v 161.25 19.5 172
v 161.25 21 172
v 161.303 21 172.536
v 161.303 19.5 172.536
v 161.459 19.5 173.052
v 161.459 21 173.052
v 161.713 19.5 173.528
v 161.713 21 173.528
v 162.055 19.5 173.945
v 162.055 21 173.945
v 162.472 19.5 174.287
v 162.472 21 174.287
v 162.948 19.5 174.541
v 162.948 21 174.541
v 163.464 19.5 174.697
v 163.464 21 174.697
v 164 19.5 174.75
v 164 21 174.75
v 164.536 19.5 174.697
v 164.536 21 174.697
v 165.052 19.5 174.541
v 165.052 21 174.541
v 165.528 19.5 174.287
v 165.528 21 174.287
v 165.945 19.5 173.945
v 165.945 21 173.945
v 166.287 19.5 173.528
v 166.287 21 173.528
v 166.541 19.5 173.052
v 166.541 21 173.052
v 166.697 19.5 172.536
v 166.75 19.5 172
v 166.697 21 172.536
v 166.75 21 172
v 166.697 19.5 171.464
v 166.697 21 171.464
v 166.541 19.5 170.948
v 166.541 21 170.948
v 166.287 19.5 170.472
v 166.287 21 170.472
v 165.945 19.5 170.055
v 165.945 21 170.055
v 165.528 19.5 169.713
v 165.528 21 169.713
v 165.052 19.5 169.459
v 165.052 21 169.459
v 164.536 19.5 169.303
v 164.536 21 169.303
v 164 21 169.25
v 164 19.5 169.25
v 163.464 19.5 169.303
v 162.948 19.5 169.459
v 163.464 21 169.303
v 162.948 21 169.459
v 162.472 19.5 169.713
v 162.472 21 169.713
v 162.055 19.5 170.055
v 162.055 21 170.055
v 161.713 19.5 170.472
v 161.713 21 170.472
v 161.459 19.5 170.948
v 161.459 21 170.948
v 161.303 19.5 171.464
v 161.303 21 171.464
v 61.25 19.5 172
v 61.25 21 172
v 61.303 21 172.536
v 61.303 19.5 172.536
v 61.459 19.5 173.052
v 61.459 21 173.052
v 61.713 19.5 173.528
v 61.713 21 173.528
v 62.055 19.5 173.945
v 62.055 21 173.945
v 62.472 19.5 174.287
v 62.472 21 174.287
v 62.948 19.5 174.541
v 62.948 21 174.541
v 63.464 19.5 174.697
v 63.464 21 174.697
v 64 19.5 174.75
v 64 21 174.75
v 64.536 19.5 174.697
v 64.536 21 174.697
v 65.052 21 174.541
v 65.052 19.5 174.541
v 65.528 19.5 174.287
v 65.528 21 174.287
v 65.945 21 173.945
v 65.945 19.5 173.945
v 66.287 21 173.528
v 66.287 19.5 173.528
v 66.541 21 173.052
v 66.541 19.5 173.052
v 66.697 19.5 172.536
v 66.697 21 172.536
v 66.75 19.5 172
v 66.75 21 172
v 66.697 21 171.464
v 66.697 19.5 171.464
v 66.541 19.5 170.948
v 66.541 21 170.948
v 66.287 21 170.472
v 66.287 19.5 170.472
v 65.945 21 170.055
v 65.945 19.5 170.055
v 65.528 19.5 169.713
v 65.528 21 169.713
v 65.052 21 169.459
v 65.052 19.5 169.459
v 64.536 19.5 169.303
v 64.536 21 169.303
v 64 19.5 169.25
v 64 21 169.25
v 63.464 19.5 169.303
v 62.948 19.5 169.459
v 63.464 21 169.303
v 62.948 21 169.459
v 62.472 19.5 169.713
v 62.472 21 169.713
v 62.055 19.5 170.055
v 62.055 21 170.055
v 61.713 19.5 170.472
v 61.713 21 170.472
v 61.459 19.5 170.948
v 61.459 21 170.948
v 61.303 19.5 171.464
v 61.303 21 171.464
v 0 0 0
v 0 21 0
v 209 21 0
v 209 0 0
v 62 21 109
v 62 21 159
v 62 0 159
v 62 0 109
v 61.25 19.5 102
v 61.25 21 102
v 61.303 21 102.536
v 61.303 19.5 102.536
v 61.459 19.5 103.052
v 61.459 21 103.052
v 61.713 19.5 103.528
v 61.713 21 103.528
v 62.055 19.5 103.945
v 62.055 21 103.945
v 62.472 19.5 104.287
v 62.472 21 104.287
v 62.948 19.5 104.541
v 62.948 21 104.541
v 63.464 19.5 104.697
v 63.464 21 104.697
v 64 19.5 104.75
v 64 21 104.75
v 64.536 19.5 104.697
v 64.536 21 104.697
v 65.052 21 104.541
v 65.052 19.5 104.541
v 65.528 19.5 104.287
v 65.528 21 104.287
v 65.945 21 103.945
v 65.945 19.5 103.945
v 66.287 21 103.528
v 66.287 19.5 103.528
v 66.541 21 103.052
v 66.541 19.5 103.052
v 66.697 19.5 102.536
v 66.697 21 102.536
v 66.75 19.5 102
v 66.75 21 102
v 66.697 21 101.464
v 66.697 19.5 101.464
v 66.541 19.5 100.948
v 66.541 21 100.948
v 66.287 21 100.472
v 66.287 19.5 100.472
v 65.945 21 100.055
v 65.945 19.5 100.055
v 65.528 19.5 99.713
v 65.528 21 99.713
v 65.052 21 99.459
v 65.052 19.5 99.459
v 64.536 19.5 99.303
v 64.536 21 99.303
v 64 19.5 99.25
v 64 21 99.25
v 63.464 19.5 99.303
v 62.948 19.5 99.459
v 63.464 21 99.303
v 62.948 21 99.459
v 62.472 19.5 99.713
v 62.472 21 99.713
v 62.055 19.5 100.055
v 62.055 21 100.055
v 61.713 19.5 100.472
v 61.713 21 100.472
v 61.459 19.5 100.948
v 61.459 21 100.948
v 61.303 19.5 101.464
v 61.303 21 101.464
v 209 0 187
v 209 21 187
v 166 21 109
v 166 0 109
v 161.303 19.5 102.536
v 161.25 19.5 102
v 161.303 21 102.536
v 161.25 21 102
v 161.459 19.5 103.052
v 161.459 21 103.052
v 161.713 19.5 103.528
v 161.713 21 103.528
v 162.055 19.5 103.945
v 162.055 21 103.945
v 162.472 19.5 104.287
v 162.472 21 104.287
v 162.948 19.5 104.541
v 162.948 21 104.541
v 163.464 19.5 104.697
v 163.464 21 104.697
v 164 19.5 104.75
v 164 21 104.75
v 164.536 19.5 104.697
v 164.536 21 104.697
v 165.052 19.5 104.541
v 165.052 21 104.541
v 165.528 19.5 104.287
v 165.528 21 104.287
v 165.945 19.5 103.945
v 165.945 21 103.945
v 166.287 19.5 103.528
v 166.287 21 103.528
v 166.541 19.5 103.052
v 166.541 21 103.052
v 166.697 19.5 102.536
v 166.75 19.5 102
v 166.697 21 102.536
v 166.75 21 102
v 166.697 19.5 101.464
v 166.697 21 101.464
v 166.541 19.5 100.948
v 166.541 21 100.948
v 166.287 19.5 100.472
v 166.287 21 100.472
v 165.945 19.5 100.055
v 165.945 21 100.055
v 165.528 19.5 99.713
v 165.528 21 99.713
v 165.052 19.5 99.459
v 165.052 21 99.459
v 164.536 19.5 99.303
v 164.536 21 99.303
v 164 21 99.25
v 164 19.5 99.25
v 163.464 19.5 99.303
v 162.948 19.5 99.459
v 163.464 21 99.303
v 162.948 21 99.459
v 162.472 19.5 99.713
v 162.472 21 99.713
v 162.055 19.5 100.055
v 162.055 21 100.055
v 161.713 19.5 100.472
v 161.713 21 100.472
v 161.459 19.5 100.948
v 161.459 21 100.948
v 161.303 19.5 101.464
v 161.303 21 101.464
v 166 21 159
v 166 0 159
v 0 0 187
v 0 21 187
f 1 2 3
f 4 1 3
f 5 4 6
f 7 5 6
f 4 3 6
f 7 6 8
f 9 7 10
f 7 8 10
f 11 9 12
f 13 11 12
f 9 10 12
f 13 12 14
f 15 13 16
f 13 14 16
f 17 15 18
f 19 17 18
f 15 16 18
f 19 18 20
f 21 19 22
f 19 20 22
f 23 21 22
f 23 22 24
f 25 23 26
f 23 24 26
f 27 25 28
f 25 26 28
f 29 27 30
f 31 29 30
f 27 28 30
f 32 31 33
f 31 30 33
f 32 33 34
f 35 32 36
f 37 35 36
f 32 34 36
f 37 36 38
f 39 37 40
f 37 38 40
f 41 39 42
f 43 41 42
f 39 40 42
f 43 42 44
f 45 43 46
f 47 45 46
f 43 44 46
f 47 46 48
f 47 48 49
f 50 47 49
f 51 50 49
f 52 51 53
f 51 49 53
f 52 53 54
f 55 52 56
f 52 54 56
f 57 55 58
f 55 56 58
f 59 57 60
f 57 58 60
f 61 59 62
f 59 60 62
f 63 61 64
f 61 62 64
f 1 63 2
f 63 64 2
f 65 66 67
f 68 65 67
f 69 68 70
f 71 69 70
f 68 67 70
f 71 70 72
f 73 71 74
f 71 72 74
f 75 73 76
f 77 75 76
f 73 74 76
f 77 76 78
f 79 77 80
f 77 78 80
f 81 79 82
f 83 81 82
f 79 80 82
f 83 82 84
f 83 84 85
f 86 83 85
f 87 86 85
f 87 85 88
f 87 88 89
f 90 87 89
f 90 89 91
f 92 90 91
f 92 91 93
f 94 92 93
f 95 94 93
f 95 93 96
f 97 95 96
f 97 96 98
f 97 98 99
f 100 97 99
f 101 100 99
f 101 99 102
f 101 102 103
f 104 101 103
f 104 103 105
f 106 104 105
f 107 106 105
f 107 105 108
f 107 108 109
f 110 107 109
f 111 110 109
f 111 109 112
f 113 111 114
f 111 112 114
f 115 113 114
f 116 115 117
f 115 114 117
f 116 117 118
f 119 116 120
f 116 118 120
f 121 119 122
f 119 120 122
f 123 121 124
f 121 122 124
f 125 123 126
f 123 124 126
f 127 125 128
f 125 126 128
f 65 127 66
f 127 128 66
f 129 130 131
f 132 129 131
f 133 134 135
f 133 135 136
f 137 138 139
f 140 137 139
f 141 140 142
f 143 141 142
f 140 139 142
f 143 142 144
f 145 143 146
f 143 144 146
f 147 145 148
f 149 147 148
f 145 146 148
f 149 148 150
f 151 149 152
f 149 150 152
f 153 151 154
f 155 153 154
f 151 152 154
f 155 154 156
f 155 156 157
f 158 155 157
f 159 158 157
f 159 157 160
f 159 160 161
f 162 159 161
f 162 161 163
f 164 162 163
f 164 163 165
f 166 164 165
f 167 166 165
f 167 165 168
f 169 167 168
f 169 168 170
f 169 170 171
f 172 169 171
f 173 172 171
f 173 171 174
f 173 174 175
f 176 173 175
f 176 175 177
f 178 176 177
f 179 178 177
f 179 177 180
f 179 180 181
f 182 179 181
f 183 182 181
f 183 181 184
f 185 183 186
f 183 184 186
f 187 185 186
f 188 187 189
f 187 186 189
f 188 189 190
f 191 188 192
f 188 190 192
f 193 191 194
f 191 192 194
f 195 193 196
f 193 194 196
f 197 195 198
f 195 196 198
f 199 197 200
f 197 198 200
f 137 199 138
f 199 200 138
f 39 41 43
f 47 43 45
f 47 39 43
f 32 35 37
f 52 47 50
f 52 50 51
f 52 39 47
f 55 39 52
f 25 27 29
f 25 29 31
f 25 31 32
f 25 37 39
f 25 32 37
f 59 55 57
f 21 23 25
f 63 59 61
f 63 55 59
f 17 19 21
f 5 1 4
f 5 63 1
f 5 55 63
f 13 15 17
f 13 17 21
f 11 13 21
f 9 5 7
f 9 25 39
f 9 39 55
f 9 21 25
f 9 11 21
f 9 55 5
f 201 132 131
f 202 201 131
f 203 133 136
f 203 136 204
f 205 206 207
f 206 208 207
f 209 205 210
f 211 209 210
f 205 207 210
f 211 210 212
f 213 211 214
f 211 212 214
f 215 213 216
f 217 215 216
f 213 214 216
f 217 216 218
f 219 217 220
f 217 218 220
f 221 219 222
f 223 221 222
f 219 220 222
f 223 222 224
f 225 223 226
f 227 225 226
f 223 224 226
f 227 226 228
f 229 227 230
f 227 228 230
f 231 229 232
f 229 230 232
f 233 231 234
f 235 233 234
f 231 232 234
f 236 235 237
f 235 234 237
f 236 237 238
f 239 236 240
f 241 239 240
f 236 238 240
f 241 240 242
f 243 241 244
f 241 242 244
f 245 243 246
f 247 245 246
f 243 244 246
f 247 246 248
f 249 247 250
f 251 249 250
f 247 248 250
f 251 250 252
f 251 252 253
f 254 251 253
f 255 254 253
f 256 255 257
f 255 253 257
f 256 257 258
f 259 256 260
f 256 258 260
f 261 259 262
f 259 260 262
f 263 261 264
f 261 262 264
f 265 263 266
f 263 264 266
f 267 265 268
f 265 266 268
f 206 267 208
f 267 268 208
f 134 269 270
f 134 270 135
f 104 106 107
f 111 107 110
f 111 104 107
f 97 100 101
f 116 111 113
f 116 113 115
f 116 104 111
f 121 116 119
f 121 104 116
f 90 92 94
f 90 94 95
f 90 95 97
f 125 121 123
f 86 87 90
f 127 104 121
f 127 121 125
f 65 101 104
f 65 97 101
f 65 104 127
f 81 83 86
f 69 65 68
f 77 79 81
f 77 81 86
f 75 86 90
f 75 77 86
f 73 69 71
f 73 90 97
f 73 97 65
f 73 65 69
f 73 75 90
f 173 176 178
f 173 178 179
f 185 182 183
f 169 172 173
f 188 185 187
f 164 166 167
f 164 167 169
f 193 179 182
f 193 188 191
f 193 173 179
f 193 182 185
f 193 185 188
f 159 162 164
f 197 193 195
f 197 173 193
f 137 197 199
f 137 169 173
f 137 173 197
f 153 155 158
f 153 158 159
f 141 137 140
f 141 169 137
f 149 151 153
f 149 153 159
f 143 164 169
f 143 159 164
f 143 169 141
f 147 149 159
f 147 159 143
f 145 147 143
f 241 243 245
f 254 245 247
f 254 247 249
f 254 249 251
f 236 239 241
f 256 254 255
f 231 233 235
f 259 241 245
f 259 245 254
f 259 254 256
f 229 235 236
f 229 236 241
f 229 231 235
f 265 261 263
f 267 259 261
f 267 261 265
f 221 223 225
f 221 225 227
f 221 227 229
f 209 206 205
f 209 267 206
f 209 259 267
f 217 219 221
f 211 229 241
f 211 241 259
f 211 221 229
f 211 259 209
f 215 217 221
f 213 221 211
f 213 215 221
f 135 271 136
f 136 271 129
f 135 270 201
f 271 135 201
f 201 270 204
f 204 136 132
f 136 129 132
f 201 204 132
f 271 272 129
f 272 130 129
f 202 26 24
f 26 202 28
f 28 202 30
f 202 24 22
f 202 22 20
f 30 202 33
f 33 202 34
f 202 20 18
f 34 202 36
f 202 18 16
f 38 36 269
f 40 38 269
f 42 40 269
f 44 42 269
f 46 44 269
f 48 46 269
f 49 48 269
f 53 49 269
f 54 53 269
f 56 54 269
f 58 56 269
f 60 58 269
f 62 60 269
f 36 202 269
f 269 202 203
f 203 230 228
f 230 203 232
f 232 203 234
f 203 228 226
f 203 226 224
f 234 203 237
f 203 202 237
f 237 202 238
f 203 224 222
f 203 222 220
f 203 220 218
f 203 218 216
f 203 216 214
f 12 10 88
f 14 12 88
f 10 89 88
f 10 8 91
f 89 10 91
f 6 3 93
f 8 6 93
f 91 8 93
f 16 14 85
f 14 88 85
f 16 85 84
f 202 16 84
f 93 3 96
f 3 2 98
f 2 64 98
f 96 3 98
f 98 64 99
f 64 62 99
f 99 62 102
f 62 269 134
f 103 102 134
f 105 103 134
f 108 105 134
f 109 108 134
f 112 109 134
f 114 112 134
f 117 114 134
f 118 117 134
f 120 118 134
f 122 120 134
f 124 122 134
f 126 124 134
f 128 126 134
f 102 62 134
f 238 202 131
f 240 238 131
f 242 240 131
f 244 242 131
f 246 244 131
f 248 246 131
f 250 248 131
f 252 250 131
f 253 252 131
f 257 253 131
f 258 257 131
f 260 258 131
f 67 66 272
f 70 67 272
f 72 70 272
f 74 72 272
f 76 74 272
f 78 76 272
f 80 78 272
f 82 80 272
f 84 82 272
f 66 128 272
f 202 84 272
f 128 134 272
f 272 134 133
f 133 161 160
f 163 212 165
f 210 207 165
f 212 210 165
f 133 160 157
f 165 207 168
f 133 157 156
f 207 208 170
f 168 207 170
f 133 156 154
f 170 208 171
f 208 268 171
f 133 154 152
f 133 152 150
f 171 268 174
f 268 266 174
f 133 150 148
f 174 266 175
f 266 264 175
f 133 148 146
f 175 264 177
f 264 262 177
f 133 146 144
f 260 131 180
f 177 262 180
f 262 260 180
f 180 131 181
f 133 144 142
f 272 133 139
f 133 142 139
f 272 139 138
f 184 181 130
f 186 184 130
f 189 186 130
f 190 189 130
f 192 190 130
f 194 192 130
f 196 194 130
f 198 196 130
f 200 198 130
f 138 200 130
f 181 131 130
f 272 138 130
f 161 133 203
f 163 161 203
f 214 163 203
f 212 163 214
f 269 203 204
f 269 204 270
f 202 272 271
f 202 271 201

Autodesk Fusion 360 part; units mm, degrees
sketch "Smartie Feed Support" plane through (0, 0, 0) normal (0, 0, 1) x (1, 0, 0)
  line L0 (0, 0) -> (209, 0)
  line L1 (209, 0) -> (209, 21)
  line L2 (209, 21) -> (0, 21)
  line L3 (0, 21) -> (0, 0)
  dimension "d1" = 209
  dimension "d2" = 21
extrude "Extrude1" add sketch "Smartie Feed Support" along normal blind 187
sketch "Outlet" plane through (0, 0, 0) normal (0, -1, 0) x (1, 0, 0)
  line L0 (0, 0) -> (209, 0)
  line L1 (209, 0) -> (209, 187)
  line L2 (209, 187) -> (0, 187)
  line L3 (0, 187) -> (0, 0)
  line L4 (69, 146) -> (159, 146)
  line L5 (159, 146) -> (159, 116)
  line L6 (159, 116) -> (69, 116)
  line L7 (69, 116) -> (69, 146)
  dimension "d31" = 30
  dimension "d32" = 90
  dimension "d33" = 69
  dimension "d34" = 50
  dimension "d35" = 41
sketch "Inlet" plane through (0, 21, 0) normal (0, 1, 0) x (-1, 0, 0)
  line L0 (-209, 0) -> (0, 0)
  line L1 (0, 0) -> (0, 187)
  line L2 (0, 187) -> (-209, 187)
  line L3 (-209, 187) -> (-209, 0)
  line L4 (-69, 152) -> (-159, 152)
  line L5 (-159, 152) -> (-159, 122)
  line L6 (-159, 122) -> (-69, 122)
  line L7 (-69, 122) -> (-69, 152)
  dimension "d36" = 90
  dimension "d37" = 69
  dimension "d38" = 30
  dimension "d39" = 35
  dimension "d40" = 50
loft "Loft9" cut profiles "Inlet", "Outlet" section 1 contours L4 L5 L6 L7 section 2 contours L4 L5 L6 L7
sketch "Magnet Holes" plane through (0, 21, 0) normal (0, 1, 0) x (-1, 0, 0)
  line L0 (-69, 152) -> (-69, 122)
  line L1 (-69, 122) -> (-159, 122)
  line L2 (-159, 122) -> (-159, 152)
  line L3 (-159, 152) -> (-69, 152)
  line L4 (-209, 0) -> (0, 0)
  line L5 (0, 0) -> (0, 187)
  line L6 (0, 187) -> (-209, 187)
  line L7 (-209, 187) -> (-209, 0)
  circle A0 centre (-164, 172) radius 2.75
  circle A1 centre (-64, 172) radius 2.75
  circle A2 centre (-164, 102) radius 2.75
  circle A3 centre (-64, 102) radius 2.75
  dimension "d43" = 5.5
  dimension "d44" = 5.5
  dimension "d45" = 5.5
  dimension "d46" = 5.5
  dimension "d49" = 64
  dimension "d50" = 64
  dimension "d51" = 164
  dimension "d52" = 164
  dimension "d53" = 20
  dimension "d54" = 20
  dimension "d55" = 20
  dimension "d56" = 20
extrude "Extrude2" cut sketch "Magnet Holes" against normal blind 1.5 contours A0 | A1 | A2 | A3
sketch "Separator" plane through (0, 21, 0) normal (0, 1, 0) x (-1, 0, 0)
  circle A0 centre (-164, 102) radius 2.75
  circle A1 centre (-64, 172) radius 2.75
  circle A2 centre (-164, 172) radius 2.75
  circle A3 centre (-64, 102) radius 2.75
  line L0 (-69, 152) -> (-69, 122)
  line L1 (-69, 122) -> (-159, 122)
  line L2 (-159, 122) -> (-159, 152)
  line L3 (-159, 152) -> (-69, 152)
  line L4 (-209, 0) -> (0, 0)
  line L5 (0, 0) -> (0, 187)
  line L6 (0, 187) -> (-209, 187)
  line L7 (-209, 187) -> (-209, 0)
  line L8 (-159, 152) -> (-69, 152)
  line L9 (-69, 152) -> (-69, 122)
  line L10 (-159, 122) -> (-159, 152)
  line L11 (-159, 116) -> (-69, 116)
  line L12 (-159, 146) -> (-159, 116)
  line L13 (-69, 116) -> (-69, 146)
  line L14 (-69, 146) -> (-159, 146)
  line L15 (-69, 122) -> (-159, 122)
  line L16 (-166, 159) -> (-62, 159)
  line L17 (-62, 159) -> (-62, 109)
  line L18 (-62, 109) -> (-166, 109)
  line L19 (-166, 109) -> (-166, 159)
  dimension "d57" = 7
  dimension "d58" = 7
  dimension "d59" = 7
  dimension "d60" = 7
extrude "Extrude3" cut sketch "Separator" against normal blind 21 contours L0 L2 L3 L8 L9 L10 L14 | L0 L1 L2 L9 L10 L12 L13 L14 L15 | L1 L11 L12 L13 L15 | L16 L17 L18 L19
equation "d1 = 219 mm - 10 mm"
equation "d3 = 166 mm + 21 mm"
equation "outletHeight = 15 mm" comment "Height of the outlets into the sorted containers"
equation "outletWidth = 20 mm" comment "Width of the outlets into the sorted containers"
equation "sortedContainersMidpointWidth = sortedContainersWidth + polycarbonateThickness" comment "Width between the midpoints of the sorted containers"
equation "sortedContainersWidth = 60 mm" comment "Width of the sorted containers"
equation "sortedContainersHeight = 113 mm" comment "Height of the sorted containers"
equation "polycarbonateThickness = 6 mm" comment "Thickness of the polycarbonate"
equation "sortedContainersMidpointHeight = sortedContainersHeight + polycarbonateThickness" comment "Height between the midpoints of the sorted containers"
equation "d33 = 90 mm - 21 mm"
equation "d35 = 30 mm - 21 mm + 5 mm + 6 mm + 21 mm"
equation "d37 = 90 mm - 21 mm"
equation "d39 = 30 mm - 21 mm + 5 mm + 21 mm"
equation "magnetDiameter = 5 mm"
equation "magnetHeight = 1.5 mm"
equation "d43 = magnetDiameter + 0.5 mm"
equation "d44 = magnetDiameter + 0.5 mm"
equation "d45 = magnetDiameter + 0.5 mm"
equation "d46 = magnetDiameter + 0.5 mm"
equation "d47 = -magnetHeight"
equation "d49 = 75 mm - 21 mm + 10 mm"
equation "d50 = 75 mm - 21 mm + 10 mm"
equation "d51 = 195 mm - 10 mm - 21 mm"
equation "d52 = 195 mm - 10 mm - 21 mm"
